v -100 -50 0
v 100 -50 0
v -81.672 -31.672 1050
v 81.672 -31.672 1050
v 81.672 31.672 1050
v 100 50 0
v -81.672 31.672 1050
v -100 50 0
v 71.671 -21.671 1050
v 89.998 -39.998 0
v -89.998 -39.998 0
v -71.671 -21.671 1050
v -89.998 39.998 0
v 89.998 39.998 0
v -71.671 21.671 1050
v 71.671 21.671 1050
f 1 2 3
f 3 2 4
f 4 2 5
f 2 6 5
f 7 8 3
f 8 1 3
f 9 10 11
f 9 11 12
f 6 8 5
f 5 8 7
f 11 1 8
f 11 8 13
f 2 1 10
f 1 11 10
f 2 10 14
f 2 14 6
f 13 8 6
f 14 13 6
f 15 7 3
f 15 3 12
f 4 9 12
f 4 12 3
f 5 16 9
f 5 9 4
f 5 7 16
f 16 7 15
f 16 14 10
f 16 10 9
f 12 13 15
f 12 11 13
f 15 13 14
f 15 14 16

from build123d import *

# Parameters (mm, degrees)
SKETCH2_W           = 200
SKETCH2_H           = 100
BOSS_EXTRUDE1_DEPTH = 1050
BOSS_EXTRUDE1_TAPER = 1
SHELL1_T            = -10


with BuildPart() as part:
    # Sketch2 → Boss-Extrude1 (new body)
    with BuildSketch(Plane.XY):
        Rectangle(SKETCH2_W, SKETCH2_H)
    extrude(amount=BOSS_EXTRUDE1_DEPTH, taper=BOSS_EXTRUDE1_TAPER)

    # Shell1
    shell1_openings = [part.faces().sort_by_distance(p)[0] for p in [
        (0, 0, 1050),
        (0, 0, 0),
    ]]
    offset(amount=SHELL1_T, openings=shell1_openings, kind=Kind.INTERSECTION)


solid = part.part
